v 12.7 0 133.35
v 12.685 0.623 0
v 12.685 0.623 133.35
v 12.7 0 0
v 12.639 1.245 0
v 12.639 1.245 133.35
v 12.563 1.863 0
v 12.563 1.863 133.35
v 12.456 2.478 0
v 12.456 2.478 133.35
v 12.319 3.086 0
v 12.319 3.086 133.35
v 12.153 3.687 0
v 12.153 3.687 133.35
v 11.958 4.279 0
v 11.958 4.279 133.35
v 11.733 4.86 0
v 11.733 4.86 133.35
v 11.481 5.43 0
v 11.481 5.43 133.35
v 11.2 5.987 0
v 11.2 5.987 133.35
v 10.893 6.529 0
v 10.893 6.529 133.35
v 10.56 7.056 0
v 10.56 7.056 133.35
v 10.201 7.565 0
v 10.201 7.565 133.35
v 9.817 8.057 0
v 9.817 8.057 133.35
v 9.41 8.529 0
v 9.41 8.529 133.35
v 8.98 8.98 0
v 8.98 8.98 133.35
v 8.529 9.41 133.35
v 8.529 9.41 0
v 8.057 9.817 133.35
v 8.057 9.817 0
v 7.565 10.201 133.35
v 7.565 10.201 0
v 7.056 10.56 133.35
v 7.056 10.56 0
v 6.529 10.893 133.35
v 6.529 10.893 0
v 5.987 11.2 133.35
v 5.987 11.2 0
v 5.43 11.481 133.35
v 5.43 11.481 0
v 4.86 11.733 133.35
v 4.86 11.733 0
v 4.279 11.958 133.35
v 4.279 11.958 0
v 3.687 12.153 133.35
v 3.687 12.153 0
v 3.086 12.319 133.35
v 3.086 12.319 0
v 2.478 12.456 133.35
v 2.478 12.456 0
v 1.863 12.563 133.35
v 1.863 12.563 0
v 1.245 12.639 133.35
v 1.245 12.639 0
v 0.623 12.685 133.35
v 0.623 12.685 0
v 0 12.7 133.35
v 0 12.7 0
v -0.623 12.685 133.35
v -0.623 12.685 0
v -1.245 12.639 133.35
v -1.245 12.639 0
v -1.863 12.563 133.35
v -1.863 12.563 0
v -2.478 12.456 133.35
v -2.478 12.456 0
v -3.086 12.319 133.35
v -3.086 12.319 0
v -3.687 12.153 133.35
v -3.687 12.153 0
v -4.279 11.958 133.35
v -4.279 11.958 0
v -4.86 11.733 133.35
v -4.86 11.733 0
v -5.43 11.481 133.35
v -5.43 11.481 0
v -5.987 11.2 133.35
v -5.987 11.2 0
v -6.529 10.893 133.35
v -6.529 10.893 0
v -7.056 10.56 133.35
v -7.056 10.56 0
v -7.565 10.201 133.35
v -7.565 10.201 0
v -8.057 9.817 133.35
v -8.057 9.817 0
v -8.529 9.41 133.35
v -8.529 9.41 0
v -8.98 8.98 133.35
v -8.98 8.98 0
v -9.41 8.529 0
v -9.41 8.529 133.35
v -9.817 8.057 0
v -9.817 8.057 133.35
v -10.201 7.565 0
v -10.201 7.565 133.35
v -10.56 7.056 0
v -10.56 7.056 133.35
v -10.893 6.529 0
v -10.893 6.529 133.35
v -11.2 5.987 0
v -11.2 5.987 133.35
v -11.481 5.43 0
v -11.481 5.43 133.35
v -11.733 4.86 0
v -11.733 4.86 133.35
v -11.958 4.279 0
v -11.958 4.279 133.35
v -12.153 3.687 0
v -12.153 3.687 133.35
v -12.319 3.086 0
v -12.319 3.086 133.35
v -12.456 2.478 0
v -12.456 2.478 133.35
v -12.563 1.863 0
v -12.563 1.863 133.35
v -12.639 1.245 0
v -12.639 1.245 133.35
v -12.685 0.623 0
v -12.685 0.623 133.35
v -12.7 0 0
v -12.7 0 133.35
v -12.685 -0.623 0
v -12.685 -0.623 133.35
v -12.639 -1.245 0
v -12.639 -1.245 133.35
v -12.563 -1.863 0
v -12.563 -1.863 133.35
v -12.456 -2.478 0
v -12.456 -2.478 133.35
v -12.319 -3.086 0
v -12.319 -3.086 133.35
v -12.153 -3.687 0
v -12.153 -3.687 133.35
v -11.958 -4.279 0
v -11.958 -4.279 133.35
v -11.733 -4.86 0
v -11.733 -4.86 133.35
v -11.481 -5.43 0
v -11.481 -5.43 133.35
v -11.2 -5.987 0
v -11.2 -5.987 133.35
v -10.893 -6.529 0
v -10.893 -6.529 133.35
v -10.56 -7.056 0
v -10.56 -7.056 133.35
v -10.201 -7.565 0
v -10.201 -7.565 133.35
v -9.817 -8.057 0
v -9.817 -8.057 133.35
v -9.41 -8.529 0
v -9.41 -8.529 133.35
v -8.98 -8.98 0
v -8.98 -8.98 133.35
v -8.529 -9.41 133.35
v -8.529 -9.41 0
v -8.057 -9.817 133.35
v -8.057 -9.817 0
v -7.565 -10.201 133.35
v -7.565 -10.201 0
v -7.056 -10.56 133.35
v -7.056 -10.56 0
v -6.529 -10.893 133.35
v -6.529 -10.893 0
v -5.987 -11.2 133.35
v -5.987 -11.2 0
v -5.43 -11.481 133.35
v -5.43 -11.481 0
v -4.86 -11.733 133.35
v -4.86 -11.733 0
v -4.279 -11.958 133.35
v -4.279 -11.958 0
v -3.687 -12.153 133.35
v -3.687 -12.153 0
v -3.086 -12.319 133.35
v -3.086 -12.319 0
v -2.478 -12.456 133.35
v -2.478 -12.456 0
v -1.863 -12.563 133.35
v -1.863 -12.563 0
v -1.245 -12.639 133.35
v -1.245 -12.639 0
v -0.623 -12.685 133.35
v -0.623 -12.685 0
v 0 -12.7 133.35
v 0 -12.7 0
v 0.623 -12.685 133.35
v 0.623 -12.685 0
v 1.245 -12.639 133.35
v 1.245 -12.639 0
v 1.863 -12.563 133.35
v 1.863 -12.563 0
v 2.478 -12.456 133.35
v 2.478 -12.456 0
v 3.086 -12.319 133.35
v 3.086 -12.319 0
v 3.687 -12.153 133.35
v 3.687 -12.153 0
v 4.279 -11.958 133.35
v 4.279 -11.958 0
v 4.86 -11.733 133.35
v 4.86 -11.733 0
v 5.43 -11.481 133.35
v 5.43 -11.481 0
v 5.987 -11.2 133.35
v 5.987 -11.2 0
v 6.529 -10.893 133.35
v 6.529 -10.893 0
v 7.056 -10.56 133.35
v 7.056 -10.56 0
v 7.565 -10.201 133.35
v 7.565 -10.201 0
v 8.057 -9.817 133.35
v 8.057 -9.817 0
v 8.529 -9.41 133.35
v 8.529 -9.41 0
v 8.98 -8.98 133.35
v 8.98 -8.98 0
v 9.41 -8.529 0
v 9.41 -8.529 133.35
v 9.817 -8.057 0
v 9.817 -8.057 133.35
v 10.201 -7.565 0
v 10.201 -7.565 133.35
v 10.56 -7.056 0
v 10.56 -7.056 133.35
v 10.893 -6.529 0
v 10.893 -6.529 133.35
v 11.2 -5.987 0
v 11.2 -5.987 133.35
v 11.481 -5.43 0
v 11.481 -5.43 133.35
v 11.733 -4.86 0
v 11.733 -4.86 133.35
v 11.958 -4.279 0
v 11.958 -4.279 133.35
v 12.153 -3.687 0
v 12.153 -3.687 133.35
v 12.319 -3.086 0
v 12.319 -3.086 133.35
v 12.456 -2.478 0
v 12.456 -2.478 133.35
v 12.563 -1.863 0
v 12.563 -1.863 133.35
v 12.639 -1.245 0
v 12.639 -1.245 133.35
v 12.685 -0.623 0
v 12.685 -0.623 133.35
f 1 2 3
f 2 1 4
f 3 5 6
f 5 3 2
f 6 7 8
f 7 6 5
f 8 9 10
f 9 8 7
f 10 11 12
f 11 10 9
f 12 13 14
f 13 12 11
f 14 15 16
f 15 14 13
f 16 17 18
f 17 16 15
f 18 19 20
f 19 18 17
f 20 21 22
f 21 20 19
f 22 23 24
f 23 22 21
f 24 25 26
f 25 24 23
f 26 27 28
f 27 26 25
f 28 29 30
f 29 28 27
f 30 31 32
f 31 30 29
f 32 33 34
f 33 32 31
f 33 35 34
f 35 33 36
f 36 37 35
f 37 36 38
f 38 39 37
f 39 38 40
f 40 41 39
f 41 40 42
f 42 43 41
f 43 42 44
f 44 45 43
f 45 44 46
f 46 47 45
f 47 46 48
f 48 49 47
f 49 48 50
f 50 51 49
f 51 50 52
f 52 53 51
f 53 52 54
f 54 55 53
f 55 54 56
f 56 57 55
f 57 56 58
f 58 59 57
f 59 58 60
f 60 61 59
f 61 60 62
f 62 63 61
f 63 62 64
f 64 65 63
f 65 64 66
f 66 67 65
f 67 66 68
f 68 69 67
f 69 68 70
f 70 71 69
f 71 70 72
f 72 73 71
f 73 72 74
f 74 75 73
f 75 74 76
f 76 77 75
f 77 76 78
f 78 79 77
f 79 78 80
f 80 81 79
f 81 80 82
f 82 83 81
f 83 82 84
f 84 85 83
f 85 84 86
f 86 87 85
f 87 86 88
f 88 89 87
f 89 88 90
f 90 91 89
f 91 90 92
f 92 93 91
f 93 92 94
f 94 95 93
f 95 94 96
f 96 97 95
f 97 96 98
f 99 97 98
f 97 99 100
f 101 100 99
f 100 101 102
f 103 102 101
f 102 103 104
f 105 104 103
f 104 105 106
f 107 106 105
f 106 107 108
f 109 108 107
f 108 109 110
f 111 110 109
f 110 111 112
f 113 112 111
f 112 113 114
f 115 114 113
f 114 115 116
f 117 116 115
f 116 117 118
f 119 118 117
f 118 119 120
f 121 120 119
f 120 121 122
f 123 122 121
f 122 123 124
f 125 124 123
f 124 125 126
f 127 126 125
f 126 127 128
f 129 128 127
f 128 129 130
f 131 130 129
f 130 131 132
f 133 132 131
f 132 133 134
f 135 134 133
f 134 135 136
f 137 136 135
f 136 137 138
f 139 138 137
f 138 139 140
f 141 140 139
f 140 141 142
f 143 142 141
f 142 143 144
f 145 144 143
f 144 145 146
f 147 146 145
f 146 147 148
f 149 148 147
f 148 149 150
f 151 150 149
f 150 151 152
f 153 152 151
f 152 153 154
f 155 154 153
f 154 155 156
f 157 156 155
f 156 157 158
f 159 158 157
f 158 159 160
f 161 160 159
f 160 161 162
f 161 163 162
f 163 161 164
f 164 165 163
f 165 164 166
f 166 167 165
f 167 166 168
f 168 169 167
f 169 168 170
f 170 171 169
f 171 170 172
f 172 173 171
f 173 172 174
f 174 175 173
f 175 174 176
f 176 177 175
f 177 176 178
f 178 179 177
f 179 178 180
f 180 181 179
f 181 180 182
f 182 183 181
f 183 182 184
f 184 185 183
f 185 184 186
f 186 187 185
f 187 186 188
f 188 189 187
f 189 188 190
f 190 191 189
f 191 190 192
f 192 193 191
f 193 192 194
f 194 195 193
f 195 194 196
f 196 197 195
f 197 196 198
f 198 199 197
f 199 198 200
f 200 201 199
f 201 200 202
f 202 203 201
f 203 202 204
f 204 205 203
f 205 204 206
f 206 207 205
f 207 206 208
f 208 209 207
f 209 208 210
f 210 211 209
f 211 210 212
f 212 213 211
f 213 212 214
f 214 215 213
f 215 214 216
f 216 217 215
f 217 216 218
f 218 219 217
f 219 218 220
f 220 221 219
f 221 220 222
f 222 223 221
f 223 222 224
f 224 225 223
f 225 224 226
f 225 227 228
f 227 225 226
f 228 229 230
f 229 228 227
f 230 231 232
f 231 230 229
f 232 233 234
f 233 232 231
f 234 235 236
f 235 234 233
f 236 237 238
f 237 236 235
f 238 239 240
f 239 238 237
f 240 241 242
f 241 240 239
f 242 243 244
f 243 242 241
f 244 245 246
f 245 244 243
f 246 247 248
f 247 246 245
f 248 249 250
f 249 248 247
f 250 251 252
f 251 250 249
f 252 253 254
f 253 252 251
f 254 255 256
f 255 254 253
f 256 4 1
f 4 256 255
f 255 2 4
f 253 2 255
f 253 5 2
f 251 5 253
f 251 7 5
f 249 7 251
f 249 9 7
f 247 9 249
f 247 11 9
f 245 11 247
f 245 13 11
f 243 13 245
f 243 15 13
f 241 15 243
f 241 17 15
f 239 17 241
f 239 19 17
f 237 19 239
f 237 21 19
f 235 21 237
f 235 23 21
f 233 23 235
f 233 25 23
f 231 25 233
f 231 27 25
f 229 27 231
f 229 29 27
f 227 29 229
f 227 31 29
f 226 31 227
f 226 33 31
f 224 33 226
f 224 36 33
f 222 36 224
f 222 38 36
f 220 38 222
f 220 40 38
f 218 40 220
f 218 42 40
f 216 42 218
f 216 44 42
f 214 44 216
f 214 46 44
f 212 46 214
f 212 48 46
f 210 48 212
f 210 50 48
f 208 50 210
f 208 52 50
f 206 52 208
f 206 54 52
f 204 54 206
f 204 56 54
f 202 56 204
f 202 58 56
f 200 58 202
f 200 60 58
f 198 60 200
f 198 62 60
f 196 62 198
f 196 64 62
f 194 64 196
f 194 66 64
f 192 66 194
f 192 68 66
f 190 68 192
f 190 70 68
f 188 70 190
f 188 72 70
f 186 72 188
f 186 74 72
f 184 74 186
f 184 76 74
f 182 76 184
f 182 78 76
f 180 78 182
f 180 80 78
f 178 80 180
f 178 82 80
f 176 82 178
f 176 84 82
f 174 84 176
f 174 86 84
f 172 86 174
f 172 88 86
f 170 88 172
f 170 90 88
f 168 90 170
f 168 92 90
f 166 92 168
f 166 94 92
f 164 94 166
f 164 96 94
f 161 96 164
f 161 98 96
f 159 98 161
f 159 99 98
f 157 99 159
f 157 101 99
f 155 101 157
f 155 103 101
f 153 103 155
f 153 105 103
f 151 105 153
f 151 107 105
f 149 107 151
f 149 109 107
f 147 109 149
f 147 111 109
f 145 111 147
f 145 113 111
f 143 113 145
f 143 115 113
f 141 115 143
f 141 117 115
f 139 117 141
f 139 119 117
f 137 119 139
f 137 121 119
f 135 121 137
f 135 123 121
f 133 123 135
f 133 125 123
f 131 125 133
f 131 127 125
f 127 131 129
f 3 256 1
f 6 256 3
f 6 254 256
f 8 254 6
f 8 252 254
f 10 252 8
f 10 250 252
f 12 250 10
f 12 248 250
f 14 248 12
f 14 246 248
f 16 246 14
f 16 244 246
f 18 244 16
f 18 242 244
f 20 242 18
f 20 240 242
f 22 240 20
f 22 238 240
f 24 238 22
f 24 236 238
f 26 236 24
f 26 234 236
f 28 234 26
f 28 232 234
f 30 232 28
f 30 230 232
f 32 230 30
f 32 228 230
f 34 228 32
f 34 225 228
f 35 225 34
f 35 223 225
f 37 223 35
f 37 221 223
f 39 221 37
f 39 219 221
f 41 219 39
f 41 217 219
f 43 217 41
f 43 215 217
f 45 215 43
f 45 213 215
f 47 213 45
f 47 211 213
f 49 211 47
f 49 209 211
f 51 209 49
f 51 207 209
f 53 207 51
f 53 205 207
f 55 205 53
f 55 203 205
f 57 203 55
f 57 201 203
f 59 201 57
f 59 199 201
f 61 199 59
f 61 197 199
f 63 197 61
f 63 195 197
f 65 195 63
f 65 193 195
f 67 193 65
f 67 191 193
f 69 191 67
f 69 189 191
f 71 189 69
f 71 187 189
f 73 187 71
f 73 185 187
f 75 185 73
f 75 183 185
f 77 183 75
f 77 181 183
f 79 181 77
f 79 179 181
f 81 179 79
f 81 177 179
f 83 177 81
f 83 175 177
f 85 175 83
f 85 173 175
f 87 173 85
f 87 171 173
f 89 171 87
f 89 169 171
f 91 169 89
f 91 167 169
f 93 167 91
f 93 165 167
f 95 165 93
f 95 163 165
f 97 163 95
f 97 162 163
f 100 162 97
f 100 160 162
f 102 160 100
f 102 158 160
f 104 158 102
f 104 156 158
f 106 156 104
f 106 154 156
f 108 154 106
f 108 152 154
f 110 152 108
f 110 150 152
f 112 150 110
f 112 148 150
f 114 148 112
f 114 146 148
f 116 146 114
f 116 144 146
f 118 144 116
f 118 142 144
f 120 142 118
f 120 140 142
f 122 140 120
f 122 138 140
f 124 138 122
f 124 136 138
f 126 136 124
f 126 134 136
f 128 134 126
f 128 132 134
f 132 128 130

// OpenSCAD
// numeric constants
eps=0.01;
$fn=128;

// Units are inches
in=25.4;

// Measurements
dRollMax  = 5 * in;
wRoll     = 4 * in;
boltR     = 0.125 * in / 2;
boltHeadR = 3/8 * in / 2;

// Key design choices
dAxle     = 1     * in;
wRollPlay = 0.25  * in;
wInset    = 0.5   * in;
wAxlePlay = 0.125 * in;
dAxlePlay = wAxlePlay;
wWallMin  = 0.25  * in;
dWallMin  = wWallMin;
h         = 5     * in;
stressR   = 0.5   * in;

// consequences
wCutout = wRoll + 2 * wRollPlay;
w       = wCutout + 2 * wInset + 2 * wWallMin;
wAxle   = wCutout + 2 * wInset - 2 * wAxlePlay;
rRound  = dAxle/2 + wAxlePlay + dWallMin;
d       = wWallMin + dRollMax/2 + dAxle /2 + dAxlePlay + dWallMin; // the most protruding point if not rounded
alpha   = atan( h / ( 2 * ( d - wWallMin ) ));  // half angle at the protruding point
d2      = d - rRound / sin( alpha );
d3      = d2 + rRound * sin( alpha );
h31     = h/2 - rRound * cos( alpha );
h32     = h/2 + rRound * cos( alpha );

// part 1 -- axle

module axle () {
    cylinder( r=dAxle/2, h=wAxle );
}

// part 2 -- main

module outerShape() {
    rotate( [ 90, 0, 90 ] )
    union () {
        linear_extrude( w ) {
            polygon( [
                [ 0,   0 ],
                [ h,   0 ],
                [ h,   wWallMin ],
                [ h32, d3 ],
                [ h31, d3 ],
                [ 0,   wWallMin ]
            ]);
         };
         translate( [ h/2, d2, 0 ] ) {
             cylinder( h=w, r=rRound );
         };
    };
}

module mainCutout() {
    translate( [ wInset + wWallMin, h, wWallMin ] )
    rotate( [ 90, 0, 0 ] ) {
        translate( [ stressR, stressR, 0 ] )
        cylinder( r=stressR, h=h+2*eps );
     
        translate( [ stressR, 0, 0 ] )
        cube( [ wCutout - 2*stressR, d, h+2*eps ] );

        translate( [ wCutout - stressR, stressR, 0 ] )
        cylinder( r=stressR, h=h+2*eps );
        
        translate( [ 0, stressR, 0 ] )
        cube( [ wCutout, d-stressR, h+2*eps ] );
    }
};

module axleCutout() {
    cylinder( r = dAxle/2 + wAxlePlay, h = wInset+eps );
    
    translate( [ -dAxle/2 - wAxlePlay, 0, 0 ] ) {
        cube( [ dAxle + 2*wAxlePlay, h, wInset+eps ] );
    };
};

module boltHole() {
    cylinder( r=boltR, h=2*dWallMin );
    translate( [ 0, 0, dWallMin ] )
    cylinder( r=boltHeadR, h=d );
}

module all() {
    difference() {
        outerShape();
        
        mainCutout();

        translate( [ wWallMin, h/2, d2 ] )
        rotate( [ 0, 90, 0 ] )
        axleCutout();

        translate( [ w - wWallMin - wInset - eps, h/2, d2 ] )
        rotate( [ 0, 90, 0 ] )
        axleCutout();
        
        translate( [ wWallMin + wInset / 2, 90, -eps ] )
        boltHole();
        
        translate( [ w - ( wWallMin + wInset / 2 ), 90, -eps ] )
        boltHole();
        
    };
};

// translate( [ wWallMin + wAxlePlay, h/2, d2 ] )
// rotate( [ 0, 90, 0 ] )
axle();

// all();
